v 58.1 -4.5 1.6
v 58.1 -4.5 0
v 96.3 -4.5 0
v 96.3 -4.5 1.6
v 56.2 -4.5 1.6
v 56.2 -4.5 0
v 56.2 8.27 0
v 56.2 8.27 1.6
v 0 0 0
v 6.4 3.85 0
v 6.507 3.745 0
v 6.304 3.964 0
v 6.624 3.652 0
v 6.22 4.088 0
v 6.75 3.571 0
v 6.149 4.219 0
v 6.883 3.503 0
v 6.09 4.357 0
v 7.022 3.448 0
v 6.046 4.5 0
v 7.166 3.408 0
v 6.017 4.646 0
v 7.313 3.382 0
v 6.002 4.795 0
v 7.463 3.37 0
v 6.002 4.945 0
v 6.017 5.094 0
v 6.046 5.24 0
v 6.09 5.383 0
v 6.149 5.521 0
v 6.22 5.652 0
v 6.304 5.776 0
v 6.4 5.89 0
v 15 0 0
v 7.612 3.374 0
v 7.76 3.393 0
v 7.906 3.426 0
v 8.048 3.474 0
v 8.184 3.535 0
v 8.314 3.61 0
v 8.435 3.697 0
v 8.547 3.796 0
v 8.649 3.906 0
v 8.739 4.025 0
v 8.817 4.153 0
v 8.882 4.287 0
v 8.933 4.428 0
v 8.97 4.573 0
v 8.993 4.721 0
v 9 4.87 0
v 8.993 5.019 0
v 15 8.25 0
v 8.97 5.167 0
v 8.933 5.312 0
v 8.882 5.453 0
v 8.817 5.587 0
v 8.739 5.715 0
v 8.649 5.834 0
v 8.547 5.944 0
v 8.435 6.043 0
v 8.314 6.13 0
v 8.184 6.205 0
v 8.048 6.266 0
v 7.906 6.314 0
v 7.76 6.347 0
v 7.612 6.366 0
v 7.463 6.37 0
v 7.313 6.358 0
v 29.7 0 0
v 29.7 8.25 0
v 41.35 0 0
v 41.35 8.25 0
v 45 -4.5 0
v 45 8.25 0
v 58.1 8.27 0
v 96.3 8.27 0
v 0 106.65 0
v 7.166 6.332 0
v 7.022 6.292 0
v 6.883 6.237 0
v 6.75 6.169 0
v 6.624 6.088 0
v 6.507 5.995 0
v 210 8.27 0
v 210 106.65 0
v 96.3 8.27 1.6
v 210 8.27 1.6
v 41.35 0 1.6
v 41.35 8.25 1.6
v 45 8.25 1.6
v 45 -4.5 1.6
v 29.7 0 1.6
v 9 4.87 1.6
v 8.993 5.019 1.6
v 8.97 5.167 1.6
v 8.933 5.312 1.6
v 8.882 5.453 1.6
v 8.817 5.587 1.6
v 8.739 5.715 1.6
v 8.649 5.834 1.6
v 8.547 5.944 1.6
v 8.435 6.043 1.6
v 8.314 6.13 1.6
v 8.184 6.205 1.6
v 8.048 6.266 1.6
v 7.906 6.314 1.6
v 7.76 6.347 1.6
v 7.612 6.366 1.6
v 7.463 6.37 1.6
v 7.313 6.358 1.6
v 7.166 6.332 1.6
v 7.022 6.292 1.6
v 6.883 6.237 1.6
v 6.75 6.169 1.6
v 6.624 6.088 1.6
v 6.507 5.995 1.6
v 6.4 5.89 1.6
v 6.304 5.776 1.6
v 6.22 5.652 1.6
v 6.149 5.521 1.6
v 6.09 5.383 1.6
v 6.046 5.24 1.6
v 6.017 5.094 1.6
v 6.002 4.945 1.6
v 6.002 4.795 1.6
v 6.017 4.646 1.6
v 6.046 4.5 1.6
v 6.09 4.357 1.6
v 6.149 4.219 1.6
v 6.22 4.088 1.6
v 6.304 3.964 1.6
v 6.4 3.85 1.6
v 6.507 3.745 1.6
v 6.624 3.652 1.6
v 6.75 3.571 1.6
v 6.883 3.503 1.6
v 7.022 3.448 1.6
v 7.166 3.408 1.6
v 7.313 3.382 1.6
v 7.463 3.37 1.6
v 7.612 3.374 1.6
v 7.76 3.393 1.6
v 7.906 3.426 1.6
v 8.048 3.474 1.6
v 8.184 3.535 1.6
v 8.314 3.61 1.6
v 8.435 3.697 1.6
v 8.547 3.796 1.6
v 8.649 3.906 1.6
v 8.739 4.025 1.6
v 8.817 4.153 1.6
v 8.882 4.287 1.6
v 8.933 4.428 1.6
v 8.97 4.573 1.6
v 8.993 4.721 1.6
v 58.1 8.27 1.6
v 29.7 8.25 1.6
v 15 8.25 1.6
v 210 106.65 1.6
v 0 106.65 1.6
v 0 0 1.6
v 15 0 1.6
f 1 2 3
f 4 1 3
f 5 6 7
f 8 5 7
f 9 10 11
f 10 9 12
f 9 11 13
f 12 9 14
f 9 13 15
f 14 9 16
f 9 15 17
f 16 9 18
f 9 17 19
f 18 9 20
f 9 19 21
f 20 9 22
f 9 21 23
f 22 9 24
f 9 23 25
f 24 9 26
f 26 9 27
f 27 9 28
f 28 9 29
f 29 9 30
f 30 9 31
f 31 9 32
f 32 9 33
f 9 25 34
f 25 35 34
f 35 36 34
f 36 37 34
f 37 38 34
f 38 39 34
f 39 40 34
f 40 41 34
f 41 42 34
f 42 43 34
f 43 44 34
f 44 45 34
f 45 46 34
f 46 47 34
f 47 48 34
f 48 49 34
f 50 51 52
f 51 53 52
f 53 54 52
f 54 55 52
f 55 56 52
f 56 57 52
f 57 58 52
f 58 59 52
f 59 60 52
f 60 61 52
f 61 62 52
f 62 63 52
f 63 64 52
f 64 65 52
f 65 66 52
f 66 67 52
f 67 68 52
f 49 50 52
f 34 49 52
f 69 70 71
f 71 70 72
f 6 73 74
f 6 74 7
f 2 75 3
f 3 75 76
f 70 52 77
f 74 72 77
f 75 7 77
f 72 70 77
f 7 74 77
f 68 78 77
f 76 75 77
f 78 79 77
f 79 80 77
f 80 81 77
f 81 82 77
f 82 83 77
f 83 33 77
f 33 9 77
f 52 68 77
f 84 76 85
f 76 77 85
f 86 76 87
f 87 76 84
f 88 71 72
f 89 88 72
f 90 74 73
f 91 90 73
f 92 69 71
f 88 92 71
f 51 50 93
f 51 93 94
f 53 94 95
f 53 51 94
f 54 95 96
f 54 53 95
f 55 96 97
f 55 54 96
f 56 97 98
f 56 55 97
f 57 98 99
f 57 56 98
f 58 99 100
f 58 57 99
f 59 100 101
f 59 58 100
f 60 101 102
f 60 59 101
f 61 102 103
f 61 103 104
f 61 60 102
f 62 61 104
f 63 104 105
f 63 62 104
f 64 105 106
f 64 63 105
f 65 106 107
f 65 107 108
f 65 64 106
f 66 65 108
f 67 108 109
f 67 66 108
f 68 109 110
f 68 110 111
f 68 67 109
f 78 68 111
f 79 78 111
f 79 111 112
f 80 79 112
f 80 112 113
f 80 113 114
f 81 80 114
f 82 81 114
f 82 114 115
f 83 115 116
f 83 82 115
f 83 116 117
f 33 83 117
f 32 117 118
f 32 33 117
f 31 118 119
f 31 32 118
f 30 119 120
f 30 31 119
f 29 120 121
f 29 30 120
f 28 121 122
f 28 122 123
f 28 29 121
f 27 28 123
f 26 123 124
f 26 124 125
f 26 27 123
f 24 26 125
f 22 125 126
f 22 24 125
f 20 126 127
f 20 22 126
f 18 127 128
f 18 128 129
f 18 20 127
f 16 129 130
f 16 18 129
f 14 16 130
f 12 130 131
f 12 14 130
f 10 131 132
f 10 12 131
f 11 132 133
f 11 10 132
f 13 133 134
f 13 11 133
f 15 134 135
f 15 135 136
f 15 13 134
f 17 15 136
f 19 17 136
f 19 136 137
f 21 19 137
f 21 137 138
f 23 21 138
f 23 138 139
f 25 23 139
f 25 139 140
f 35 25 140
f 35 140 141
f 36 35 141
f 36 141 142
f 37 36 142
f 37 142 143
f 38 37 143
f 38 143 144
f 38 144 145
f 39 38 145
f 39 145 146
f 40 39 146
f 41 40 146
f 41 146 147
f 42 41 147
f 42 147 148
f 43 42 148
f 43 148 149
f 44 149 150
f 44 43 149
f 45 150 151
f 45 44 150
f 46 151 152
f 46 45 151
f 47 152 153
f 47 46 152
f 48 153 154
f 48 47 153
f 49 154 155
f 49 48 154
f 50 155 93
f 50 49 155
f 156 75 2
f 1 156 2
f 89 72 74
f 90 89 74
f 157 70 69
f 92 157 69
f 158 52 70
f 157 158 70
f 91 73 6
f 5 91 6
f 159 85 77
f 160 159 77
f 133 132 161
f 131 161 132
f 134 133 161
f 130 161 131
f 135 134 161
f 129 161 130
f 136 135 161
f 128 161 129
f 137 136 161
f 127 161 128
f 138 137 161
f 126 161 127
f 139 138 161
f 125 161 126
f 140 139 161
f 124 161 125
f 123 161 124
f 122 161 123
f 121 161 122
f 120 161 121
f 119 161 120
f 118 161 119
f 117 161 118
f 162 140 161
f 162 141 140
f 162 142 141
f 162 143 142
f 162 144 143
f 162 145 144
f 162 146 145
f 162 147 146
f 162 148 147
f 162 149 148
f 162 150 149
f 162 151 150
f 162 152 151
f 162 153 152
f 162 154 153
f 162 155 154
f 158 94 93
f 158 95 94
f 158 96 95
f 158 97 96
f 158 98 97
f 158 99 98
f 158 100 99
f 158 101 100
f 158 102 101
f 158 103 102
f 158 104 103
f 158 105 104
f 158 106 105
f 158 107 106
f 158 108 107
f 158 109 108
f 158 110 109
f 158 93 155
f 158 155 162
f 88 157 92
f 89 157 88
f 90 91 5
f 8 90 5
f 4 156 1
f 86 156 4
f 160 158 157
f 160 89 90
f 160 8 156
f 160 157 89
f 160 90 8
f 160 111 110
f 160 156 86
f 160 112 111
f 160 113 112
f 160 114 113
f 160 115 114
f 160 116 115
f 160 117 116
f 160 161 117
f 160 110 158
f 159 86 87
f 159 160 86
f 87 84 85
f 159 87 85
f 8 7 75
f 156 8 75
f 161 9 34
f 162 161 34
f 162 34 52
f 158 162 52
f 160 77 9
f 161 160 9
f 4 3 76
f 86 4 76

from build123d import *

# Parameters (mm, degrees)
F0_R     = 1.5
F1_DEPTH = 1.6


with BuildPart() as f1:
    # F0 (on Top) → F1 (new body)
    with BuildSketch(Plane.XY):
        Polygon((210, 8.27), (210, 106.65), (0, 106.65), (0, 0), (15, 0), (15, 8.25), (29.7, 8.25), (29.7, 0), (41.35, 0), (41.35, 8.25), (45, 8.25), (45, -4.5), (56.2, -4.5), (56.2, 8.27), (58.1, 8.27), (58.1, -4.5), (96.3, -4.5), (96.3, 8.27), align=None)
        with Locations((7.5, 4.87)):
            Circle(F0_R, mode=Mode.SUBTRACT)
    extrude(amount=F1_DEPTH)


solid = f1.part
